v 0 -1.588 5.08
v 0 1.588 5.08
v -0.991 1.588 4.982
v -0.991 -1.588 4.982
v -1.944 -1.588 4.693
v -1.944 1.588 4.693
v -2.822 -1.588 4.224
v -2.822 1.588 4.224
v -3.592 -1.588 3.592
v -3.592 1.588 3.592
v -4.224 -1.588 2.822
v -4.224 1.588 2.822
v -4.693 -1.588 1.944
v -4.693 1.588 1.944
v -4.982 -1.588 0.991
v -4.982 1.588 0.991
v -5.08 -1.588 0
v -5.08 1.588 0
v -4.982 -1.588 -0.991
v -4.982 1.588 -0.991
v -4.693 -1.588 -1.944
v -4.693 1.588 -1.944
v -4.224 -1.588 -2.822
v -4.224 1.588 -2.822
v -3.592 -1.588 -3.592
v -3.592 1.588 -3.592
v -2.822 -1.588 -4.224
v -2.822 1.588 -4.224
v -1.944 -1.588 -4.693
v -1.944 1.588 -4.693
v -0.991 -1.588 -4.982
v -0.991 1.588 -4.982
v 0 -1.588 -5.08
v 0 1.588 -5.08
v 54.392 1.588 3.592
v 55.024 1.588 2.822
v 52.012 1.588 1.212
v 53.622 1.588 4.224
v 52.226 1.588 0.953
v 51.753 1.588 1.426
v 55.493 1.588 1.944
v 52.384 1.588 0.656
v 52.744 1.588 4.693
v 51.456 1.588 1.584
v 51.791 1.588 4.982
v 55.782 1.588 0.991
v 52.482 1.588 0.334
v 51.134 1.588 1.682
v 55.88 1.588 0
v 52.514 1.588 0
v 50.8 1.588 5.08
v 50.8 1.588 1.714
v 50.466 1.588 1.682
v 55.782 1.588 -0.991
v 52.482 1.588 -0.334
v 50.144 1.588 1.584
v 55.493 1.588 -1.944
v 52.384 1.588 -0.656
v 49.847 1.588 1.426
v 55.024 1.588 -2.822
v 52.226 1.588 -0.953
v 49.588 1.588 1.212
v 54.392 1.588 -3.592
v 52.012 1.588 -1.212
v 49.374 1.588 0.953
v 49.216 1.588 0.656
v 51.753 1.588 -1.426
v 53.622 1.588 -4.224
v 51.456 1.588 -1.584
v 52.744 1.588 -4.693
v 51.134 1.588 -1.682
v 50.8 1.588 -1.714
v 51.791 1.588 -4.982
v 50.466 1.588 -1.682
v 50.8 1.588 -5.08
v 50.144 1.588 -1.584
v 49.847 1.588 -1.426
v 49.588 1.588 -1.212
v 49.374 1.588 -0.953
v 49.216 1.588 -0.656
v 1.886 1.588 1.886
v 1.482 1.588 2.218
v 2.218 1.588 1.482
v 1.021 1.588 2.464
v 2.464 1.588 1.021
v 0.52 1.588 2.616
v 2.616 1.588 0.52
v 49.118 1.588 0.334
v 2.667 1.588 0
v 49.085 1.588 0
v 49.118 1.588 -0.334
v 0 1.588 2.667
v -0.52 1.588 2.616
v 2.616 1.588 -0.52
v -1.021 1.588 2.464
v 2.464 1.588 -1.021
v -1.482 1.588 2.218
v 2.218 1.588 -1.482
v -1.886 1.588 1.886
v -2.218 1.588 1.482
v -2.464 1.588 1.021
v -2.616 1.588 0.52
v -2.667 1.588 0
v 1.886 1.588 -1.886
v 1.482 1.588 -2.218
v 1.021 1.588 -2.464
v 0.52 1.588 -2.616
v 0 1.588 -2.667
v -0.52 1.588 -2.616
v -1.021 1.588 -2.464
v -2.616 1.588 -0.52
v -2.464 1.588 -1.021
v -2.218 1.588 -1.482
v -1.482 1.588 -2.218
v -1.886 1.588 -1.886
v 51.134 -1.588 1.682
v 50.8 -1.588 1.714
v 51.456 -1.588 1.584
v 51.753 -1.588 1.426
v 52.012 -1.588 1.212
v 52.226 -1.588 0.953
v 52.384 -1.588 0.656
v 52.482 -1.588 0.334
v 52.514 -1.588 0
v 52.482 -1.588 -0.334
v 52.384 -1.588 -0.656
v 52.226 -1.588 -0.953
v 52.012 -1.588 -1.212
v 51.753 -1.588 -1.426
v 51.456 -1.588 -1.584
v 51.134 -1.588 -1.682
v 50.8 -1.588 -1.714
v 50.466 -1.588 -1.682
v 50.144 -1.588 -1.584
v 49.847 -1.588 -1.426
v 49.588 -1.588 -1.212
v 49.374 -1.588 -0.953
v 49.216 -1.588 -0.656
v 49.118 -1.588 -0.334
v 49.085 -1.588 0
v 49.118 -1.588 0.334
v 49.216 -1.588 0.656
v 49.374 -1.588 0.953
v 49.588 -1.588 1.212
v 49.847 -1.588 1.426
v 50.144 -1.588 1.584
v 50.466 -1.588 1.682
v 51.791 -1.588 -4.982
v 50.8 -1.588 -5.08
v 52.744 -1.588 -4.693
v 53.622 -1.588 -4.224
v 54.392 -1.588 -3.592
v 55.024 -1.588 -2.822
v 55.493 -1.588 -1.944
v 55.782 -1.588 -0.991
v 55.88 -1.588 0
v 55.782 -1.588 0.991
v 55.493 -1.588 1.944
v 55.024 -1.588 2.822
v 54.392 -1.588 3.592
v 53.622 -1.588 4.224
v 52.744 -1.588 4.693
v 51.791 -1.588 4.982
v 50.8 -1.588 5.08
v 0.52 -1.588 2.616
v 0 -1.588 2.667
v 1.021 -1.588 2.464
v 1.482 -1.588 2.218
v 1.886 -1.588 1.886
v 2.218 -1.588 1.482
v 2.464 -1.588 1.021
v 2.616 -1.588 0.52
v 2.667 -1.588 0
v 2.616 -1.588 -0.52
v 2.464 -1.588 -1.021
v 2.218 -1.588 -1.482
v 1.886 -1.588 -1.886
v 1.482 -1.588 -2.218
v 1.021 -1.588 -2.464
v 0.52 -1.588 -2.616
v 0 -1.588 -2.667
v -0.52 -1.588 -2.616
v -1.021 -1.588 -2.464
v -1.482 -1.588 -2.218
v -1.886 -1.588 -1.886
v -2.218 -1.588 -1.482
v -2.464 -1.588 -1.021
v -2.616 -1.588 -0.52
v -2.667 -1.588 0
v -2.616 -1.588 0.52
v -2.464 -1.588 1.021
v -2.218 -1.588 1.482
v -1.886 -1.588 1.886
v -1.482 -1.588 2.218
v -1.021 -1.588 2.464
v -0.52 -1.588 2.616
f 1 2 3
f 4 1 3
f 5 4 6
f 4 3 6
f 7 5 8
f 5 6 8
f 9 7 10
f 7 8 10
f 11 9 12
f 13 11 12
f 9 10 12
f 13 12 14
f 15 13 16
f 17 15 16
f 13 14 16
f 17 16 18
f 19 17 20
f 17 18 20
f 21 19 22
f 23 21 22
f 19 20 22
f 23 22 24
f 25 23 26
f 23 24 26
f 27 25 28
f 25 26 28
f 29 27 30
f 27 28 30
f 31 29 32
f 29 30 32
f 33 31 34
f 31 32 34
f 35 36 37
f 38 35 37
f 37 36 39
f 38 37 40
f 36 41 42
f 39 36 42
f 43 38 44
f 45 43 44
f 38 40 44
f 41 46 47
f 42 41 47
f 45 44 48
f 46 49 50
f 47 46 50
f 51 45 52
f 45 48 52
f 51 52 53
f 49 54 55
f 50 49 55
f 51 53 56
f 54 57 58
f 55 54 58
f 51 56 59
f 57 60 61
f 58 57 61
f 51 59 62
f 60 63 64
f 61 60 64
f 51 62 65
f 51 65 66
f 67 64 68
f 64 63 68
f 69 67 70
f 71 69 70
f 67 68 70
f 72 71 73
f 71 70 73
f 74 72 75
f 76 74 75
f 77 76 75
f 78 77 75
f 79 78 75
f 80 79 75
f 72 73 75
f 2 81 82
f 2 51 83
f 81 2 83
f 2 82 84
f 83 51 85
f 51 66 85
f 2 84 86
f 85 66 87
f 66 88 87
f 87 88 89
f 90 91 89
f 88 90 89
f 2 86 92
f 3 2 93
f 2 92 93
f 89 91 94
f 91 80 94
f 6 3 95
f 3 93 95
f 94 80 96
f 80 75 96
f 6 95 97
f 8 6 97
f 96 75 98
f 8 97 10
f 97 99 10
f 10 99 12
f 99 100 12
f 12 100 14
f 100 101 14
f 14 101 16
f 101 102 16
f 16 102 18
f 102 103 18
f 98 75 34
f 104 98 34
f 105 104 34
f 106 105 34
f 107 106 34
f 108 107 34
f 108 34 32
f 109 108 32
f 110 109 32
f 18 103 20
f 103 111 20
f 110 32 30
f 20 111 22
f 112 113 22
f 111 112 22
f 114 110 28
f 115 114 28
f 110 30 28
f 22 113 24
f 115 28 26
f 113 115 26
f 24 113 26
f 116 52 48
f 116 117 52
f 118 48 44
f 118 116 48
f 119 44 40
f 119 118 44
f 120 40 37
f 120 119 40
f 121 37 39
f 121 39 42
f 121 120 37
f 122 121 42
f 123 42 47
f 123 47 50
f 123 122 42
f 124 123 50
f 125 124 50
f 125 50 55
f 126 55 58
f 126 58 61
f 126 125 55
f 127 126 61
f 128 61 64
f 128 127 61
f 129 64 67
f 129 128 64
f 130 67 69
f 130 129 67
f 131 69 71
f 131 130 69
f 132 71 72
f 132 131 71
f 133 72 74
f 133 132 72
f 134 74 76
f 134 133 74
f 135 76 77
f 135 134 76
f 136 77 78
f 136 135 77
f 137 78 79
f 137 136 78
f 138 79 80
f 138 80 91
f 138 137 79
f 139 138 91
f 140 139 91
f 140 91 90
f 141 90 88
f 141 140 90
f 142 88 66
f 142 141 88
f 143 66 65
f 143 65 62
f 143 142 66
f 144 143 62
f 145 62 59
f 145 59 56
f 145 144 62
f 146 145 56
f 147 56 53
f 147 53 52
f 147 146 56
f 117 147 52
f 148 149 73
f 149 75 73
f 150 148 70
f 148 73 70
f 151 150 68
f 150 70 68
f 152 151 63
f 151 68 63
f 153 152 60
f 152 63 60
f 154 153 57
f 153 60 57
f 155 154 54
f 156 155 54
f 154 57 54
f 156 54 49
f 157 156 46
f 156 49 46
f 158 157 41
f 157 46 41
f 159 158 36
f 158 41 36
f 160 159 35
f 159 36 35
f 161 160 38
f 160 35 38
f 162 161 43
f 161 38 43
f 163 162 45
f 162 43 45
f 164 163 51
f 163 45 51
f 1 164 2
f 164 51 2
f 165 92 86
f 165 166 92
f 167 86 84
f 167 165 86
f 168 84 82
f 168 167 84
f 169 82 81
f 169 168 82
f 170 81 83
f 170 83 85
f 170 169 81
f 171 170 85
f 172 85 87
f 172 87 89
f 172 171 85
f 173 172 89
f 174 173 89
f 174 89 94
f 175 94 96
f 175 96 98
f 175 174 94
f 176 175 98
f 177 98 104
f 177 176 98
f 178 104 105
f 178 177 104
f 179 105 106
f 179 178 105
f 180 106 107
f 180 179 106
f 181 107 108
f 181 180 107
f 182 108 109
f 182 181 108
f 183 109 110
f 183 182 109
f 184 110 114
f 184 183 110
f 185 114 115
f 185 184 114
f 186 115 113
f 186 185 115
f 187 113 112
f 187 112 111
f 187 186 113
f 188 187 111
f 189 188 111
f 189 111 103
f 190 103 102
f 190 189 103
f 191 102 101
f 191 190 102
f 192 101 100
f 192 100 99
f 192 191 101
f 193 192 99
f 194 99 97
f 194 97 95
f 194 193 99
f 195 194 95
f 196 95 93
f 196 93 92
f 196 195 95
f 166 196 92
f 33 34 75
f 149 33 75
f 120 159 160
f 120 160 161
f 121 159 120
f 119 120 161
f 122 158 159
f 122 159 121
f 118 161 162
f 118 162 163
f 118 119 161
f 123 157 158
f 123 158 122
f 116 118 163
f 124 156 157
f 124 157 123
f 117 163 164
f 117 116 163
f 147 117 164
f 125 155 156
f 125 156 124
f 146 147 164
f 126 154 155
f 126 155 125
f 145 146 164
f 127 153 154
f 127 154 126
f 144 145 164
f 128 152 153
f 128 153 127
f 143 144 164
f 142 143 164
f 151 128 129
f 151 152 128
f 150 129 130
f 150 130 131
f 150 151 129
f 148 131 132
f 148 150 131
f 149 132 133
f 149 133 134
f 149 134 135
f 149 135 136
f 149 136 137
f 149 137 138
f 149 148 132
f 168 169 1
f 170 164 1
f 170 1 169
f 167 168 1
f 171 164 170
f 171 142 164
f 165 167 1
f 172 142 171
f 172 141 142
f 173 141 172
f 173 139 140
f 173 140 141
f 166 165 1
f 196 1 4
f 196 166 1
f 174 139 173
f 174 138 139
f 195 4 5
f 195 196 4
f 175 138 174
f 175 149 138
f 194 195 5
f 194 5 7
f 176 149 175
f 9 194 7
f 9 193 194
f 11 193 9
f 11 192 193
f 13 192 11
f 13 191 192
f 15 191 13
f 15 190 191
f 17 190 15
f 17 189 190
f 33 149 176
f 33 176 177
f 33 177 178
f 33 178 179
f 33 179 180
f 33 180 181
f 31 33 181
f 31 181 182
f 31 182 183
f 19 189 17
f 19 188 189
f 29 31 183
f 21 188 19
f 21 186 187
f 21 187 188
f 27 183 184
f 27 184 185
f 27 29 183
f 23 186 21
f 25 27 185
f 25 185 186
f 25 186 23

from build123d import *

# Parameters (mm, degrees)
SKETCH1_R           = 2.667
SKETCH1_R_2         = 1.7145
BOSS_EXTRUDE1_DEPTH = 1.5875


with BuildPart() as part:
    # Sketch1 → Boss-Extrude1 (new, symmetric)
    with BuildSketch(Plane(origin=(0, 0, 0), x_dir=(1, 0, 0), z_dir=(0, 1, 0))):
        with BuildLine():
            Line((0, 5.08), (50.8, 5.08))
            ThreePointArc((50.8, 5.08), (55.88, 0), (50.8, -5.08))
            Line((50.8, -5.08), (0, -5.08))
            ThreePointArc((0, -5.08), (-5.08, 0), (0, 5.08))
        make_face()
        with Locations(Location((0, 0, 0), (0, 0, 270))):
            Circle(SKETCH1_R, mode=Mode.SUBTRACT)
        with Locations(Location((50.8, 0, 0), (0, 0, 270))):
            Circle(SKETCH1_R_2, mode=Mode.SUBTRACT)
    extrude(amount=BOSS_EXTRUDE1_DEPTH, both=True)


solid = part.part
